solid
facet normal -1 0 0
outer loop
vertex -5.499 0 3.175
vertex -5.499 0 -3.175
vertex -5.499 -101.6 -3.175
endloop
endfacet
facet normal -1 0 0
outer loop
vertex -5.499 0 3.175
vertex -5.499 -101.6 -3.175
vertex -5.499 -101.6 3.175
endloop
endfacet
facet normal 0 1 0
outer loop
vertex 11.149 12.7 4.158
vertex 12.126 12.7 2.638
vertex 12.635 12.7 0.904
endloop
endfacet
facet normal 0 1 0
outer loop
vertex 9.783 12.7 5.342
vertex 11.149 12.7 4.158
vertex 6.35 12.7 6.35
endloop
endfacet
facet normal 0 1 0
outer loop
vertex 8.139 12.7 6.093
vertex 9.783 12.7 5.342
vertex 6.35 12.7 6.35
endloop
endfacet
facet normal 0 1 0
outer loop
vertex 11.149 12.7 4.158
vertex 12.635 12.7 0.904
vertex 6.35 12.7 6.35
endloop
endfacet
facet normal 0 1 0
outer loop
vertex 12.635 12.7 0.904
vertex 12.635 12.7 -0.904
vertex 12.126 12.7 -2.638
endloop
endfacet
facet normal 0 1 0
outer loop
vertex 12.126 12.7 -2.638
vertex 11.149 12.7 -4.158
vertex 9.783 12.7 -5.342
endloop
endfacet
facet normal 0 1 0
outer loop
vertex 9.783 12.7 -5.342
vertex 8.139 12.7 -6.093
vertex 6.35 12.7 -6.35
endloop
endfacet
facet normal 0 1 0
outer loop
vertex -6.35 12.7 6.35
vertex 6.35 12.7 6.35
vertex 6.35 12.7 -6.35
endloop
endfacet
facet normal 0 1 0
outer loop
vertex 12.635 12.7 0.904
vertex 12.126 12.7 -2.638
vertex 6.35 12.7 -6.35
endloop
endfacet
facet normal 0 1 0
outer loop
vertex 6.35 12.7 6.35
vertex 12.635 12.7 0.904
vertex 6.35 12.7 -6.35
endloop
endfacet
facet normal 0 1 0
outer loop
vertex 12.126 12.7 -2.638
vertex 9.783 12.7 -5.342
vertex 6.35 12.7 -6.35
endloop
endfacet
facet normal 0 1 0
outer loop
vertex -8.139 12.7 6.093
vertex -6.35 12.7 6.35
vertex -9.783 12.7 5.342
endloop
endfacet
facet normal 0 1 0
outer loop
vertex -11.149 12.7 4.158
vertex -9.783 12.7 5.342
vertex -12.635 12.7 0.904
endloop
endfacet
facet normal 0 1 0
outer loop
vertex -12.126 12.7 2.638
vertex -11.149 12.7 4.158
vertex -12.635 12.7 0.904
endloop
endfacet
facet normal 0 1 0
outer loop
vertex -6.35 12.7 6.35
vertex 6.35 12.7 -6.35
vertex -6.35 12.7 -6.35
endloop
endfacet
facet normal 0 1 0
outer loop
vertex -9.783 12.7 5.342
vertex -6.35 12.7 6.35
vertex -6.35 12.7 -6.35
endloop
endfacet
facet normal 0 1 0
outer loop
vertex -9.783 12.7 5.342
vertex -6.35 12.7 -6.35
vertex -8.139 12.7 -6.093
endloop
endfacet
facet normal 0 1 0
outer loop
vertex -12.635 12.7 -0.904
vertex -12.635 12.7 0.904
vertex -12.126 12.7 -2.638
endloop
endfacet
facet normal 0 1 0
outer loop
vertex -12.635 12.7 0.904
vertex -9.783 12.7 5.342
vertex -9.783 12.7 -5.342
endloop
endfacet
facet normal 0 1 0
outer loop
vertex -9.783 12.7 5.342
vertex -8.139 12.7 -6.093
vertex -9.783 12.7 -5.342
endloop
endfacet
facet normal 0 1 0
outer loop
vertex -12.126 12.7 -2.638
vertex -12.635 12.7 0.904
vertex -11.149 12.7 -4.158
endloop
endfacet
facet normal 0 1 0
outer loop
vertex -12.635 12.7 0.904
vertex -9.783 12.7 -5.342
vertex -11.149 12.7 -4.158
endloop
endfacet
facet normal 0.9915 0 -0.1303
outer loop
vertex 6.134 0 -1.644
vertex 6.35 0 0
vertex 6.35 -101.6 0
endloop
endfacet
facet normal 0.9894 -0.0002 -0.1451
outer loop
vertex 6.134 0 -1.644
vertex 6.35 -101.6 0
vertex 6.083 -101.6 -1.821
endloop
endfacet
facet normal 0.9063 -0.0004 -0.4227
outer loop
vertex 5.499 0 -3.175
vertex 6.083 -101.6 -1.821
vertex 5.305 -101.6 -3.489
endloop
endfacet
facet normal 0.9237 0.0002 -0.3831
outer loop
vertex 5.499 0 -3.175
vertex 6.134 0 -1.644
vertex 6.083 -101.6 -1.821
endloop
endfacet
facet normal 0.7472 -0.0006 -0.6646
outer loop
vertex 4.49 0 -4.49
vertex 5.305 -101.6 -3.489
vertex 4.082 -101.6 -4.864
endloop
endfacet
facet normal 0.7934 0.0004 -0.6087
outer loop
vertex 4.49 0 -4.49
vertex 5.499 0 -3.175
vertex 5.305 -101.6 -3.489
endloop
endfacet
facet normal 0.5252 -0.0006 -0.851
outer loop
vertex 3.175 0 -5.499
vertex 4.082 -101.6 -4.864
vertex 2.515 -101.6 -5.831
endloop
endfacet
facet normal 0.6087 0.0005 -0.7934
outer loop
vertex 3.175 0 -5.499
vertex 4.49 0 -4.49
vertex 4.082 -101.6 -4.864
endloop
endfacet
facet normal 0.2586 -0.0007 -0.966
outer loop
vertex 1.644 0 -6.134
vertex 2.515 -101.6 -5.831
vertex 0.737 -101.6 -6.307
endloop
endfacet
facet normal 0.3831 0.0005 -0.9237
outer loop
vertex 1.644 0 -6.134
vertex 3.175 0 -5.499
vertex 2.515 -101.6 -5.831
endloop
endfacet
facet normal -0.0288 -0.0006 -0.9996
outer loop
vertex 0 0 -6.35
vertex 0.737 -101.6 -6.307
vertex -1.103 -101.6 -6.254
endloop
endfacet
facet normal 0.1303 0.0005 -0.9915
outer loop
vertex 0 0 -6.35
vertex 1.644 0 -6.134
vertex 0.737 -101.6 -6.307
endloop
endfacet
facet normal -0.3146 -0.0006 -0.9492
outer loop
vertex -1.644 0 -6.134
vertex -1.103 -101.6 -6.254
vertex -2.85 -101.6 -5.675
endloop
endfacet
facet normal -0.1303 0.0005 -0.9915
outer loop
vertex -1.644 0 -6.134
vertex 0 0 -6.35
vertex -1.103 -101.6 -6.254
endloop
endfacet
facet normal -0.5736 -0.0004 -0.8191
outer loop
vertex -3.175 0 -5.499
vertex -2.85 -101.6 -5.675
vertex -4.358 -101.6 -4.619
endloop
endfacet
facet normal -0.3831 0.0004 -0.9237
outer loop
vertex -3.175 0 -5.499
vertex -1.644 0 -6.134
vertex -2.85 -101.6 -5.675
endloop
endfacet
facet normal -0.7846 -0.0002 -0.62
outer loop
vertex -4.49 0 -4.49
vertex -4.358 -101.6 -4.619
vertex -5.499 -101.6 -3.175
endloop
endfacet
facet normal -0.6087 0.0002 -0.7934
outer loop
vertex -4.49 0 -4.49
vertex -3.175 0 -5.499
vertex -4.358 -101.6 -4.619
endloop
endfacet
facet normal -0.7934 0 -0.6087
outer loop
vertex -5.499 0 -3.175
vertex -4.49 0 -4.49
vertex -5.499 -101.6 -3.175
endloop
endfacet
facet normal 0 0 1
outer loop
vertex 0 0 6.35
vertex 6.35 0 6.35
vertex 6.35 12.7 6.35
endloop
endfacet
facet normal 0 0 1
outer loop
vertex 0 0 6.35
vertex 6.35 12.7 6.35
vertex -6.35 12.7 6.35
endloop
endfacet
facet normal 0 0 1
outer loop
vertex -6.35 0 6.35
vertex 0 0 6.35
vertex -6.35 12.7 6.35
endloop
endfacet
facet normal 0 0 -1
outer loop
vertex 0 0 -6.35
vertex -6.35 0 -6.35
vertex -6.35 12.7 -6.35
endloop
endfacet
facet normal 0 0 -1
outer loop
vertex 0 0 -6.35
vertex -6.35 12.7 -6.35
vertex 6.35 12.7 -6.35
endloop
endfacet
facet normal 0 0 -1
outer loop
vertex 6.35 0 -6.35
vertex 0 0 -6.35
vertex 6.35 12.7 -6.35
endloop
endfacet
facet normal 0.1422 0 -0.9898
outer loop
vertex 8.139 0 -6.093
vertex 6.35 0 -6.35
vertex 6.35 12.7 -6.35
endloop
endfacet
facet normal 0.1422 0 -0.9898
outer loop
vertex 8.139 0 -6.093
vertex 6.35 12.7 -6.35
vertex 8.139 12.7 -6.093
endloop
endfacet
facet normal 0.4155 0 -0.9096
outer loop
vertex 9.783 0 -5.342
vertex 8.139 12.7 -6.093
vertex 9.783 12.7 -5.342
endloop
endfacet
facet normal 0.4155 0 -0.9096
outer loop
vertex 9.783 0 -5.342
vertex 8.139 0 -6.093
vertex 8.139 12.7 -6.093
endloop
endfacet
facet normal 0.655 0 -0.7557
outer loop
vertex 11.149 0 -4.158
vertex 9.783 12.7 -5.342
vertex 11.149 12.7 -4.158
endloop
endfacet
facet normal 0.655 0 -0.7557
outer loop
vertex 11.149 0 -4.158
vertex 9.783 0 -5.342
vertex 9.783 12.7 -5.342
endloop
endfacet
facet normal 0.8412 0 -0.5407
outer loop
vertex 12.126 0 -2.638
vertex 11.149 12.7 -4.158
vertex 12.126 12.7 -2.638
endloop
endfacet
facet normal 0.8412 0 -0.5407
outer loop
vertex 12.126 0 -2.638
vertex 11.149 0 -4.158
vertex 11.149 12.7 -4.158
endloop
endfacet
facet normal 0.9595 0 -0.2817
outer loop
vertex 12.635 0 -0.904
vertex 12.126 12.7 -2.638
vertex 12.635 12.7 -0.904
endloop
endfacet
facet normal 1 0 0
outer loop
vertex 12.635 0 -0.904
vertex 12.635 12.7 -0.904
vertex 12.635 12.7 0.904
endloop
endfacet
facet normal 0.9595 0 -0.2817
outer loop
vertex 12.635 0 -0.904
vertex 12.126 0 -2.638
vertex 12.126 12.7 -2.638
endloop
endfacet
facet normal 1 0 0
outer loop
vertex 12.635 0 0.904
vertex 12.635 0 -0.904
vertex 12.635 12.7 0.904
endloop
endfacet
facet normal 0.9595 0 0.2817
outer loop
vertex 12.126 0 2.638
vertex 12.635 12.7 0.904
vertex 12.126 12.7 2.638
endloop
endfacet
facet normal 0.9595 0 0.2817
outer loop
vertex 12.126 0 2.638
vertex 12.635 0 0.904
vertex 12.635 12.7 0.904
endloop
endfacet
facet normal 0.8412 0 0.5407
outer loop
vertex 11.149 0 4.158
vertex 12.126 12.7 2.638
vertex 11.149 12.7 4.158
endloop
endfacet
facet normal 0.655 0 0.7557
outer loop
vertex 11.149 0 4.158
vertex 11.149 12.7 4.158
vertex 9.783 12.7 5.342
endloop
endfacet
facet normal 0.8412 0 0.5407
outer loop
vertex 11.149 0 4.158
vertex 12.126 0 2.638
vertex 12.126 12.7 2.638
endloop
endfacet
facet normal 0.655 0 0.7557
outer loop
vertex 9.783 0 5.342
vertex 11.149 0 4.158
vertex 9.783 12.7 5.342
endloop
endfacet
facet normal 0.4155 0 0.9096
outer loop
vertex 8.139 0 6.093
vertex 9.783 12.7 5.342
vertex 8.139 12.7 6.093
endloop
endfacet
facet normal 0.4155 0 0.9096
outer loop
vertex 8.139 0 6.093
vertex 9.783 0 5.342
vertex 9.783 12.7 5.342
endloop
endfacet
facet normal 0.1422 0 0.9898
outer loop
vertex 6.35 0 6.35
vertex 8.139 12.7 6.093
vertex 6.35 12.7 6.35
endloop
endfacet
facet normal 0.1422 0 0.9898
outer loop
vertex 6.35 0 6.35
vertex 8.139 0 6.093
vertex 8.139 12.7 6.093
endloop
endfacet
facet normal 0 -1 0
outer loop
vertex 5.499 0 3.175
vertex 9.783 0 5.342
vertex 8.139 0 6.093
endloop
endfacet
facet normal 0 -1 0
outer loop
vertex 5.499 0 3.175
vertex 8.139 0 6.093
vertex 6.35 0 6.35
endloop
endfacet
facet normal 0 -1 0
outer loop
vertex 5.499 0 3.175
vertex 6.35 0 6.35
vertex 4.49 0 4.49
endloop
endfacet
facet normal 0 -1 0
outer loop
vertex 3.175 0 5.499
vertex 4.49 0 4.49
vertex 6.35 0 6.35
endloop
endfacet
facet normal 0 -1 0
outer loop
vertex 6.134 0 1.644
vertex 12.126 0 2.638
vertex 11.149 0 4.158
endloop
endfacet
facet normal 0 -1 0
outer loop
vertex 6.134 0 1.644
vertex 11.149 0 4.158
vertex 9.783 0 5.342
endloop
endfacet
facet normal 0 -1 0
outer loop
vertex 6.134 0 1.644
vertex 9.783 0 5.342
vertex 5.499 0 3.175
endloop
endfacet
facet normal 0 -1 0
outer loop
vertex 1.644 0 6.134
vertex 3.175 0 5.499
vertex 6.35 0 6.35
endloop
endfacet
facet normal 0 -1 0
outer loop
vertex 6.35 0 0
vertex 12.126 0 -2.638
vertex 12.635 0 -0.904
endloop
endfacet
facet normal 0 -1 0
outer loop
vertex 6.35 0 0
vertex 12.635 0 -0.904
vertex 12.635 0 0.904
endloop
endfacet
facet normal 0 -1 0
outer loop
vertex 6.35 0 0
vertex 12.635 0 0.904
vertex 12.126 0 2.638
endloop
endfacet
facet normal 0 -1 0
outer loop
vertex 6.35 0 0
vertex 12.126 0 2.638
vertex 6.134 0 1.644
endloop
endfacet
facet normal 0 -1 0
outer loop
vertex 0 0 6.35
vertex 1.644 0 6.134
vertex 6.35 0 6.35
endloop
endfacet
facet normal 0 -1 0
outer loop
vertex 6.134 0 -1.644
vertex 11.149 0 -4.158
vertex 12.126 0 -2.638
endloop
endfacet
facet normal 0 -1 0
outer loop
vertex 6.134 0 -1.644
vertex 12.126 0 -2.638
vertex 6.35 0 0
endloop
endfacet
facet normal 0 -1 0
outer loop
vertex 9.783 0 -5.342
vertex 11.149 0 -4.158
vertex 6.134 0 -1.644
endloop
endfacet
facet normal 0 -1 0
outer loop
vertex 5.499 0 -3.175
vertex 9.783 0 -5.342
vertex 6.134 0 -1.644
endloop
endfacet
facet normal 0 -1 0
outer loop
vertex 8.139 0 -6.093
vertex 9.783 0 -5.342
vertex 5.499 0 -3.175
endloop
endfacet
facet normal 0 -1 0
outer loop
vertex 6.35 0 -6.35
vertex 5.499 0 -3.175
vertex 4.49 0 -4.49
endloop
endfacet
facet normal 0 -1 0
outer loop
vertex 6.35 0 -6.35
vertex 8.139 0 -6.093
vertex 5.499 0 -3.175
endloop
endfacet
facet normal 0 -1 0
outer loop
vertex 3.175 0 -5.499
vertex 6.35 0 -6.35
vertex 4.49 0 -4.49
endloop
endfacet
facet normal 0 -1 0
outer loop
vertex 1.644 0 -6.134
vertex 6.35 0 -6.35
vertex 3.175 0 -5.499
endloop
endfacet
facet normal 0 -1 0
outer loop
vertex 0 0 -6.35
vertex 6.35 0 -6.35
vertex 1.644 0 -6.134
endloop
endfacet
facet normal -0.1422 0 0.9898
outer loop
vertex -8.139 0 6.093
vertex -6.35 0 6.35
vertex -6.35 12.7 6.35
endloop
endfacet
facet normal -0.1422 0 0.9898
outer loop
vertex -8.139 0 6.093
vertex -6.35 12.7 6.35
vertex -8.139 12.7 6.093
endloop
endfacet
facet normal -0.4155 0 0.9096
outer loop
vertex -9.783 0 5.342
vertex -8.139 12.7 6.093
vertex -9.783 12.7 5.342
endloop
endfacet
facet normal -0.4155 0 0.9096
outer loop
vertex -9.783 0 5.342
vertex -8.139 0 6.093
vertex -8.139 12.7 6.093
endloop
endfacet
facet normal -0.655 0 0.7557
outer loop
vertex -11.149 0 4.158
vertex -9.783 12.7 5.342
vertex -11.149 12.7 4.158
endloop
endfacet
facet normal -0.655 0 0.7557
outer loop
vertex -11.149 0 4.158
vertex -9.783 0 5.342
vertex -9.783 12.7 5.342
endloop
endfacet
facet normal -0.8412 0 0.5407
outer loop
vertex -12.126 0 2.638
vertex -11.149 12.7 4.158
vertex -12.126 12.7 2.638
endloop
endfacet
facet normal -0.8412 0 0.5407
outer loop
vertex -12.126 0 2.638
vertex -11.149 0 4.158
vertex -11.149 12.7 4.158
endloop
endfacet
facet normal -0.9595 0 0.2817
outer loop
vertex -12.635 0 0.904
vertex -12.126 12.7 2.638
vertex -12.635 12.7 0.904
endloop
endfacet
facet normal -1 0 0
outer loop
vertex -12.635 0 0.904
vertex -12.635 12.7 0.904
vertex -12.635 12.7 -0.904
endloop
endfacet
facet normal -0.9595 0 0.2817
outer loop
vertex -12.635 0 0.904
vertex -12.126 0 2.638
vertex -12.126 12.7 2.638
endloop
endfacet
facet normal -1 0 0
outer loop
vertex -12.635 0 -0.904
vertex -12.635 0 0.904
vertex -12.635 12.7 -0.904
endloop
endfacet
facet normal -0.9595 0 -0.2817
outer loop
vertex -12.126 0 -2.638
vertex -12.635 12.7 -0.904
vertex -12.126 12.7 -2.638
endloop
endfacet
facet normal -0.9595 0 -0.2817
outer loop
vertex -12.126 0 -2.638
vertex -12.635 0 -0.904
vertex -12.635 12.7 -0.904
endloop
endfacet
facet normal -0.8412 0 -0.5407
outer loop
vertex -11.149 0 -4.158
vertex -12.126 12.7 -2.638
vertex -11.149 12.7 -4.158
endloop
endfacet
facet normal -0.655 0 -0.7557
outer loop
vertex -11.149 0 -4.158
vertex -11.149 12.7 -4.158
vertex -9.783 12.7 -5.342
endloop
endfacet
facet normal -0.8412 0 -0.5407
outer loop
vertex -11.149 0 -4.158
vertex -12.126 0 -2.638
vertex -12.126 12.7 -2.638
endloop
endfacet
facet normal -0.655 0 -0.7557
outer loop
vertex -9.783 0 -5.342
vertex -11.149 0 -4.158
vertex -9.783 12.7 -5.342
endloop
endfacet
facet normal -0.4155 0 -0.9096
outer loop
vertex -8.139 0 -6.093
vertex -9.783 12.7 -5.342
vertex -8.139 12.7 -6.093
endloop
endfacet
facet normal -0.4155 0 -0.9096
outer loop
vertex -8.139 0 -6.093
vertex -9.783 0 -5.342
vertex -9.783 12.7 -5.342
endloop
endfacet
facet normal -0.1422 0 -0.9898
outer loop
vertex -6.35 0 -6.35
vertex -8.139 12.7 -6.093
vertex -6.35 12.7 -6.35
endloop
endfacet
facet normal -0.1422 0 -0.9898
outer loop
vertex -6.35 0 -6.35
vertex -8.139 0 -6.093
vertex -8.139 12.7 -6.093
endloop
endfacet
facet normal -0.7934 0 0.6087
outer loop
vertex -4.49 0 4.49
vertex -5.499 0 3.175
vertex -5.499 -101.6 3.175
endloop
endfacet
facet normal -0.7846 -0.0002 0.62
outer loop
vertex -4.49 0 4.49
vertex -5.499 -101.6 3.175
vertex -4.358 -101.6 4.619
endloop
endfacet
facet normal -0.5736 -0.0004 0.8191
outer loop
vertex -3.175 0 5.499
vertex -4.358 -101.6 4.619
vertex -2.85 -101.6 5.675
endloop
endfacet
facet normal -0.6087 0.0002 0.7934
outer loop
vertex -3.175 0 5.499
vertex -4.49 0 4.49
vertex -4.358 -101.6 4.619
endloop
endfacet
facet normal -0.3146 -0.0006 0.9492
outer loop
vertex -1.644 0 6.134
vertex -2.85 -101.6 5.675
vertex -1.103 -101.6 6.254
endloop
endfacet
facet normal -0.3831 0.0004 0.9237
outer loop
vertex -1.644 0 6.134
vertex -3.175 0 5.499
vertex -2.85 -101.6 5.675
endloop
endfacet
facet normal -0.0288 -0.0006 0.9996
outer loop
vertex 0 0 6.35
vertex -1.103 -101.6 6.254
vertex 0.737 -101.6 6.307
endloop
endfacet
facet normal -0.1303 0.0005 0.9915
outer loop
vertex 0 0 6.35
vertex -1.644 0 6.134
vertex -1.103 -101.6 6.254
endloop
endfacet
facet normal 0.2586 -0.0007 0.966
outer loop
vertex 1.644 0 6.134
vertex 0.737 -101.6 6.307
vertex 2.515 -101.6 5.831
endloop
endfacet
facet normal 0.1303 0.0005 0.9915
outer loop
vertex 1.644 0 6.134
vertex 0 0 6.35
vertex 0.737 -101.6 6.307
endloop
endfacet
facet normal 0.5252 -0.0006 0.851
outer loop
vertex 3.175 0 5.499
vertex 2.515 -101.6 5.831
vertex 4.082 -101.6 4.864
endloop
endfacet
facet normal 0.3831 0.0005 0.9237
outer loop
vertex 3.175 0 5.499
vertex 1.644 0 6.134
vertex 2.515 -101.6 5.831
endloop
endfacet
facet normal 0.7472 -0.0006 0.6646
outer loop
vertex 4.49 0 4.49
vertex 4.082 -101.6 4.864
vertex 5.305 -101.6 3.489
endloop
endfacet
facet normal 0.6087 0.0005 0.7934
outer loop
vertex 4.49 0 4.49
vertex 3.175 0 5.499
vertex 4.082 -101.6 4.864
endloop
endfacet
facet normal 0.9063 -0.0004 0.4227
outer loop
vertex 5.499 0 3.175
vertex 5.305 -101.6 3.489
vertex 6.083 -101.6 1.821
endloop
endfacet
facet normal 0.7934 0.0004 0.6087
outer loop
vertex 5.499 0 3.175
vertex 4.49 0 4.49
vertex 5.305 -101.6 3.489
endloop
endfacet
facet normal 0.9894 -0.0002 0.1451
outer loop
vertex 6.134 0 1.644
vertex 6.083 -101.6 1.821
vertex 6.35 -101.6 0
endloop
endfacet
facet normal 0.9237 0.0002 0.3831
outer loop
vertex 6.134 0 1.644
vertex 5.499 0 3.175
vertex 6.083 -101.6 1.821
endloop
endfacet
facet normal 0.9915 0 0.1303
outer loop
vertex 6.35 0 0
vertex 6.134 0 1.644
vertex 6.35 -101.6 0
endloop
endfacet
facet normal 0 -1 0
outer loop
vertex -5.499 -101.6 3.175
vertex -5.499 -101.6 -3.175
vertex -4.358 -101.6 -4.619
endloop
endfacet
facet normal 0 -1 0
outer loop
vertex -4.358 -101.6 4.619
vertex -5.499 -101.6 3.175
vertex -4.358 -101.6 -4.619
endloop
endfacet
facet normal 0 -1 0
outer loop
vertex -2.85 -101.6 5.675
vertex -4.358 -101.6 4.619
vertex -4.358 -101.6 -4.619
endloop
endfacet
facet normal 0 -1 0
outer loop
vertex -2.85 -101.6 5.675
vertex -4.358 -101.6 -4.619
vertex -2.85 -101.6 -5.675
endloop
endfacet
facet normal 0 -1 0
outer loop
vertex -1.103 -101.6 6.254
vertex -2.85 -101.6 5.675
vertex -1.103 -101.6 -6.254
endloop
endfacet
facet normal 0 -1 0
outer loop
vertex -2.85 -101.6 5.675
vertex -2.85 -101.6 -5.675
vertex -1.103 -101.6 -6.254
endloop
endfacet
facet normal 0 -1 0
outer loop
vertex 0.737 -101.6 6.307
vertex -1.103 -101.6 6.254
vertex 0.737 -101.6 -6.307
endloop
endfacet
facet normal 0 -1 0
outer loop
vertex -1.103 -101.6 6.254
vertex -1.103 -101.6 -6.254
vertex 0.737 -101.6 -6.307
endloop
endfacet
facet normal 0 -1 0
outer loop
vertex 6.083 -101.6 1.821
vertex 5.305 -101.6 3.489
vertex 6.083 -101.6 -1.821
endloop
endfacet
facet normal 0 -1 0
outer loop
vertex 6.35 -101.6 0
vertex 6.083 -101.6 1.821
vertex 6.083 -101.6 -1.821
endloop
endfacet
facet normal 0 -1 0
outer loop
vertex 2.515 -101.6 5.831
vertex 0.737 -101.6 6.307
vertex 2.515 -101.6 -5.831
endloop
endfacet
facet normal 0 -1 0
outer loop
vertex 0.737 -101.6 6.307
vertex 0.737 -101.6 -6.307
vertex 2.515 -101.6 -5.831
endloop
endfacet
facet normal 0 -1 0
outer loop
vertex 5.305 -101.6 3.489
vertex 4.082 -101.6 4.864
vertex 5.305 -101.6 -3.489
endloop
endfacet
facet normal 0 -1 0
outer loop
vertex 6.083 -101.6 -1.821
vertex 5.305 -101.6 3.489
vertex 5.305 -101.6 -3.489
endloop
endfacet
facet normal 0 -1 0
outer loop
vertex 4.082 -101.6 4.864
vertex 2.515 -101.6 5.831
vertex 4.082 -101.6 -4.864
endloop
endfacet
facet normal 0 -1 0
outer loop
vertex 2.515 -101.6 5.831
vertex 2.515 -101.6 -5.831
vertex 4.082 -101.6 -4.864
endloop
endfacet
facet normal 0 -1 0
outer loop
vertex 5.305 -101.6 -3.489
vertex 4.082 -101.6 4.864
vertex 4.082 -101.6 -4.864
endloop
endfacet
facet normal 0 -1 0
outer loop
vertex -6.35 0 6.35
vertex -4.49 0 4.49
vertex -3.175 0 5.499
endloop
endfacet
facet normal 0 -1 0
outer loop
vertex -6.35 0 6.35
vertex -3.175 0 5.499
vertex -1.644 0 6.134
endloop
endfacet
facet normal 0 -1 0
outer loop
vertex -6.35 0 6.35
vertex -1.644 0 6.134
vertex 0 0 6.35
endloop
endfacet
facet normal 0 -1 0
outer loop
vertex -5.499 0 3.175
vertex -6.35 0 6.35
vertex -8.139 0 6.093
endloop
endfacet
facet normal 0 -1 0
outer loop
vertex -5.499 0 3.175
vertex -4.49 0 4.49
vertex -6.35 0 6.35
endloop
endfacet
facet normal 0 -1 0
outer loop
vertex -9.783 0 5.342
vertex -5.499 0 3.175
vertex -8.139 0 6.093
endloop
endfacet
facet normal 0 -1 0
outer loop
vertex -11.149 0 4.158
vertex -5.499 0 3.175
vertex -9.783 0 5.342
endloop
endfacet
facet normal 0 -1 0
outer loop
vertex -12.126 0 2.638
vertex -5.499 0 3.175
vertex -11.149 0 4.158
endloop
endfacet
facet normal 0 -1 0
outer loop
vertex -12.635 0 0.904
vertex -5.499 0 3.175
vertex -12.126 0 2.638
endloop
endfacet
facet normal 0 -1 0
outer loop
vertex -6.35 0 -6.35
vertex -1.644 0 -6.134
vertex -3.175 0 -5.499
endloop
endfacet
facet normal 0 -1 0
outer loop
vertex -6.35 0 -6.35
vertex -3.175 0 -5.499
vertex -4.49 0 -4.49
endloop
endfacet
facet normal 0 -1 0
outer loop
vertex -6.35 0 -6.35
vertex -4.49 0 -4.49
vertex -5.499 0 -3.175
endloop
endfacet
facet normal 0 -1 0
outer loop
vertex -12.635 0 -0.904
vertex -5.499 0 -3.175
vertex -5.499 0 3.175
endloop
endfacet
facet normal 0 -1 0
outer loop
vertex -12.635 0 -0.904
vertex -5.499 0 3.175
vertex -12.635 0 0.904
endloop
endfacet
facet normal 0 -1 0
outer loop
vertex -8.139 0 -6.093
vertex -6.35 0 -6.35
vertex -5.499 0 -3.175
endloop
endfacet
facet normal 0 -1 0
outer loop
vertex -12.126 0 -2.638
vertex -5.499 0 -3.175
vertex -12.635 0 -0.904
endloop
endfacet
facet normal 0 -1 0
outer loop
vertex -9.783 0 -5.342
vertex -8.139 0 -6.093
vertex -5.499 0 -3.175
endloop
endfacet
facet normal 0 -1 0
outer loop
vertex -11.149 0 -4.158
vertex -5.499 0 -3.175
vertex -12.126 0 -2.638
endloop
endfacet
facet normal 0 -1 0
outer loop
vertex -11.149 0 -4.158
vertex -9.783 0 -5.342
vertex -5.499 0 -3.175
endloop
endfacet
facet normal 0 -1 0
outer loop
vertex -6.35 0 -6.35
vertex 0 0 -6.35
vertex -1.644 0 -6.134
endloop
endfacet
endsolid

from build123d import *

# Parameters (mm, degrees)
BOSS_EXTRUDE1_DEPTH = 101.6
BOSS_EXTRUDE3_DEPTH = 12.7


with BuildPart() as part:
    # Sketch1 → Boss-Extrude1 (new body)
    with BuildSketch(Plane(origin=(0, 0, 0), x_dir=(1, 0, 0), z_dir=(0, 1, 0))):
        with BuildLine():
            Line((-5.499261314, 3.175), (-5.499261314, -3.175))
            ThreePointArc((-5.499261314, -3.175), (1.643500936, -6.133628997), (6.35, 0))
            ThreePointArc((6.35, 0), (1.643500936, 6.133628997), (-5.499261314, 3.175))
        make_face()
    extrude(amount=-BOSS_EXTRUDE1_DEPTH)

    # Sketch4 → Boss-Extrude3 (add)
    with BuildSketch(Plane(origin=(0, 0, 0), x_dir=(1, 0, 0), z_dir=(0, 1, 0))):
        with BuildLine():
            Line((-6.35, 6.35), (6.35, 6.35))
            ThreePointArc((6.35, 6.35), (12.7, 0), (6.35, -6.35))
            Line((6.35, -6.35), (-6.35, -6.35))
            ThreePointArc((-6.35, -6.35), (-12.7, 0), (-6.35, 6.35))
        make_face()
    extrude(amount=BOSS_EXTRUDE3_DEPTH)


solid = part.part
